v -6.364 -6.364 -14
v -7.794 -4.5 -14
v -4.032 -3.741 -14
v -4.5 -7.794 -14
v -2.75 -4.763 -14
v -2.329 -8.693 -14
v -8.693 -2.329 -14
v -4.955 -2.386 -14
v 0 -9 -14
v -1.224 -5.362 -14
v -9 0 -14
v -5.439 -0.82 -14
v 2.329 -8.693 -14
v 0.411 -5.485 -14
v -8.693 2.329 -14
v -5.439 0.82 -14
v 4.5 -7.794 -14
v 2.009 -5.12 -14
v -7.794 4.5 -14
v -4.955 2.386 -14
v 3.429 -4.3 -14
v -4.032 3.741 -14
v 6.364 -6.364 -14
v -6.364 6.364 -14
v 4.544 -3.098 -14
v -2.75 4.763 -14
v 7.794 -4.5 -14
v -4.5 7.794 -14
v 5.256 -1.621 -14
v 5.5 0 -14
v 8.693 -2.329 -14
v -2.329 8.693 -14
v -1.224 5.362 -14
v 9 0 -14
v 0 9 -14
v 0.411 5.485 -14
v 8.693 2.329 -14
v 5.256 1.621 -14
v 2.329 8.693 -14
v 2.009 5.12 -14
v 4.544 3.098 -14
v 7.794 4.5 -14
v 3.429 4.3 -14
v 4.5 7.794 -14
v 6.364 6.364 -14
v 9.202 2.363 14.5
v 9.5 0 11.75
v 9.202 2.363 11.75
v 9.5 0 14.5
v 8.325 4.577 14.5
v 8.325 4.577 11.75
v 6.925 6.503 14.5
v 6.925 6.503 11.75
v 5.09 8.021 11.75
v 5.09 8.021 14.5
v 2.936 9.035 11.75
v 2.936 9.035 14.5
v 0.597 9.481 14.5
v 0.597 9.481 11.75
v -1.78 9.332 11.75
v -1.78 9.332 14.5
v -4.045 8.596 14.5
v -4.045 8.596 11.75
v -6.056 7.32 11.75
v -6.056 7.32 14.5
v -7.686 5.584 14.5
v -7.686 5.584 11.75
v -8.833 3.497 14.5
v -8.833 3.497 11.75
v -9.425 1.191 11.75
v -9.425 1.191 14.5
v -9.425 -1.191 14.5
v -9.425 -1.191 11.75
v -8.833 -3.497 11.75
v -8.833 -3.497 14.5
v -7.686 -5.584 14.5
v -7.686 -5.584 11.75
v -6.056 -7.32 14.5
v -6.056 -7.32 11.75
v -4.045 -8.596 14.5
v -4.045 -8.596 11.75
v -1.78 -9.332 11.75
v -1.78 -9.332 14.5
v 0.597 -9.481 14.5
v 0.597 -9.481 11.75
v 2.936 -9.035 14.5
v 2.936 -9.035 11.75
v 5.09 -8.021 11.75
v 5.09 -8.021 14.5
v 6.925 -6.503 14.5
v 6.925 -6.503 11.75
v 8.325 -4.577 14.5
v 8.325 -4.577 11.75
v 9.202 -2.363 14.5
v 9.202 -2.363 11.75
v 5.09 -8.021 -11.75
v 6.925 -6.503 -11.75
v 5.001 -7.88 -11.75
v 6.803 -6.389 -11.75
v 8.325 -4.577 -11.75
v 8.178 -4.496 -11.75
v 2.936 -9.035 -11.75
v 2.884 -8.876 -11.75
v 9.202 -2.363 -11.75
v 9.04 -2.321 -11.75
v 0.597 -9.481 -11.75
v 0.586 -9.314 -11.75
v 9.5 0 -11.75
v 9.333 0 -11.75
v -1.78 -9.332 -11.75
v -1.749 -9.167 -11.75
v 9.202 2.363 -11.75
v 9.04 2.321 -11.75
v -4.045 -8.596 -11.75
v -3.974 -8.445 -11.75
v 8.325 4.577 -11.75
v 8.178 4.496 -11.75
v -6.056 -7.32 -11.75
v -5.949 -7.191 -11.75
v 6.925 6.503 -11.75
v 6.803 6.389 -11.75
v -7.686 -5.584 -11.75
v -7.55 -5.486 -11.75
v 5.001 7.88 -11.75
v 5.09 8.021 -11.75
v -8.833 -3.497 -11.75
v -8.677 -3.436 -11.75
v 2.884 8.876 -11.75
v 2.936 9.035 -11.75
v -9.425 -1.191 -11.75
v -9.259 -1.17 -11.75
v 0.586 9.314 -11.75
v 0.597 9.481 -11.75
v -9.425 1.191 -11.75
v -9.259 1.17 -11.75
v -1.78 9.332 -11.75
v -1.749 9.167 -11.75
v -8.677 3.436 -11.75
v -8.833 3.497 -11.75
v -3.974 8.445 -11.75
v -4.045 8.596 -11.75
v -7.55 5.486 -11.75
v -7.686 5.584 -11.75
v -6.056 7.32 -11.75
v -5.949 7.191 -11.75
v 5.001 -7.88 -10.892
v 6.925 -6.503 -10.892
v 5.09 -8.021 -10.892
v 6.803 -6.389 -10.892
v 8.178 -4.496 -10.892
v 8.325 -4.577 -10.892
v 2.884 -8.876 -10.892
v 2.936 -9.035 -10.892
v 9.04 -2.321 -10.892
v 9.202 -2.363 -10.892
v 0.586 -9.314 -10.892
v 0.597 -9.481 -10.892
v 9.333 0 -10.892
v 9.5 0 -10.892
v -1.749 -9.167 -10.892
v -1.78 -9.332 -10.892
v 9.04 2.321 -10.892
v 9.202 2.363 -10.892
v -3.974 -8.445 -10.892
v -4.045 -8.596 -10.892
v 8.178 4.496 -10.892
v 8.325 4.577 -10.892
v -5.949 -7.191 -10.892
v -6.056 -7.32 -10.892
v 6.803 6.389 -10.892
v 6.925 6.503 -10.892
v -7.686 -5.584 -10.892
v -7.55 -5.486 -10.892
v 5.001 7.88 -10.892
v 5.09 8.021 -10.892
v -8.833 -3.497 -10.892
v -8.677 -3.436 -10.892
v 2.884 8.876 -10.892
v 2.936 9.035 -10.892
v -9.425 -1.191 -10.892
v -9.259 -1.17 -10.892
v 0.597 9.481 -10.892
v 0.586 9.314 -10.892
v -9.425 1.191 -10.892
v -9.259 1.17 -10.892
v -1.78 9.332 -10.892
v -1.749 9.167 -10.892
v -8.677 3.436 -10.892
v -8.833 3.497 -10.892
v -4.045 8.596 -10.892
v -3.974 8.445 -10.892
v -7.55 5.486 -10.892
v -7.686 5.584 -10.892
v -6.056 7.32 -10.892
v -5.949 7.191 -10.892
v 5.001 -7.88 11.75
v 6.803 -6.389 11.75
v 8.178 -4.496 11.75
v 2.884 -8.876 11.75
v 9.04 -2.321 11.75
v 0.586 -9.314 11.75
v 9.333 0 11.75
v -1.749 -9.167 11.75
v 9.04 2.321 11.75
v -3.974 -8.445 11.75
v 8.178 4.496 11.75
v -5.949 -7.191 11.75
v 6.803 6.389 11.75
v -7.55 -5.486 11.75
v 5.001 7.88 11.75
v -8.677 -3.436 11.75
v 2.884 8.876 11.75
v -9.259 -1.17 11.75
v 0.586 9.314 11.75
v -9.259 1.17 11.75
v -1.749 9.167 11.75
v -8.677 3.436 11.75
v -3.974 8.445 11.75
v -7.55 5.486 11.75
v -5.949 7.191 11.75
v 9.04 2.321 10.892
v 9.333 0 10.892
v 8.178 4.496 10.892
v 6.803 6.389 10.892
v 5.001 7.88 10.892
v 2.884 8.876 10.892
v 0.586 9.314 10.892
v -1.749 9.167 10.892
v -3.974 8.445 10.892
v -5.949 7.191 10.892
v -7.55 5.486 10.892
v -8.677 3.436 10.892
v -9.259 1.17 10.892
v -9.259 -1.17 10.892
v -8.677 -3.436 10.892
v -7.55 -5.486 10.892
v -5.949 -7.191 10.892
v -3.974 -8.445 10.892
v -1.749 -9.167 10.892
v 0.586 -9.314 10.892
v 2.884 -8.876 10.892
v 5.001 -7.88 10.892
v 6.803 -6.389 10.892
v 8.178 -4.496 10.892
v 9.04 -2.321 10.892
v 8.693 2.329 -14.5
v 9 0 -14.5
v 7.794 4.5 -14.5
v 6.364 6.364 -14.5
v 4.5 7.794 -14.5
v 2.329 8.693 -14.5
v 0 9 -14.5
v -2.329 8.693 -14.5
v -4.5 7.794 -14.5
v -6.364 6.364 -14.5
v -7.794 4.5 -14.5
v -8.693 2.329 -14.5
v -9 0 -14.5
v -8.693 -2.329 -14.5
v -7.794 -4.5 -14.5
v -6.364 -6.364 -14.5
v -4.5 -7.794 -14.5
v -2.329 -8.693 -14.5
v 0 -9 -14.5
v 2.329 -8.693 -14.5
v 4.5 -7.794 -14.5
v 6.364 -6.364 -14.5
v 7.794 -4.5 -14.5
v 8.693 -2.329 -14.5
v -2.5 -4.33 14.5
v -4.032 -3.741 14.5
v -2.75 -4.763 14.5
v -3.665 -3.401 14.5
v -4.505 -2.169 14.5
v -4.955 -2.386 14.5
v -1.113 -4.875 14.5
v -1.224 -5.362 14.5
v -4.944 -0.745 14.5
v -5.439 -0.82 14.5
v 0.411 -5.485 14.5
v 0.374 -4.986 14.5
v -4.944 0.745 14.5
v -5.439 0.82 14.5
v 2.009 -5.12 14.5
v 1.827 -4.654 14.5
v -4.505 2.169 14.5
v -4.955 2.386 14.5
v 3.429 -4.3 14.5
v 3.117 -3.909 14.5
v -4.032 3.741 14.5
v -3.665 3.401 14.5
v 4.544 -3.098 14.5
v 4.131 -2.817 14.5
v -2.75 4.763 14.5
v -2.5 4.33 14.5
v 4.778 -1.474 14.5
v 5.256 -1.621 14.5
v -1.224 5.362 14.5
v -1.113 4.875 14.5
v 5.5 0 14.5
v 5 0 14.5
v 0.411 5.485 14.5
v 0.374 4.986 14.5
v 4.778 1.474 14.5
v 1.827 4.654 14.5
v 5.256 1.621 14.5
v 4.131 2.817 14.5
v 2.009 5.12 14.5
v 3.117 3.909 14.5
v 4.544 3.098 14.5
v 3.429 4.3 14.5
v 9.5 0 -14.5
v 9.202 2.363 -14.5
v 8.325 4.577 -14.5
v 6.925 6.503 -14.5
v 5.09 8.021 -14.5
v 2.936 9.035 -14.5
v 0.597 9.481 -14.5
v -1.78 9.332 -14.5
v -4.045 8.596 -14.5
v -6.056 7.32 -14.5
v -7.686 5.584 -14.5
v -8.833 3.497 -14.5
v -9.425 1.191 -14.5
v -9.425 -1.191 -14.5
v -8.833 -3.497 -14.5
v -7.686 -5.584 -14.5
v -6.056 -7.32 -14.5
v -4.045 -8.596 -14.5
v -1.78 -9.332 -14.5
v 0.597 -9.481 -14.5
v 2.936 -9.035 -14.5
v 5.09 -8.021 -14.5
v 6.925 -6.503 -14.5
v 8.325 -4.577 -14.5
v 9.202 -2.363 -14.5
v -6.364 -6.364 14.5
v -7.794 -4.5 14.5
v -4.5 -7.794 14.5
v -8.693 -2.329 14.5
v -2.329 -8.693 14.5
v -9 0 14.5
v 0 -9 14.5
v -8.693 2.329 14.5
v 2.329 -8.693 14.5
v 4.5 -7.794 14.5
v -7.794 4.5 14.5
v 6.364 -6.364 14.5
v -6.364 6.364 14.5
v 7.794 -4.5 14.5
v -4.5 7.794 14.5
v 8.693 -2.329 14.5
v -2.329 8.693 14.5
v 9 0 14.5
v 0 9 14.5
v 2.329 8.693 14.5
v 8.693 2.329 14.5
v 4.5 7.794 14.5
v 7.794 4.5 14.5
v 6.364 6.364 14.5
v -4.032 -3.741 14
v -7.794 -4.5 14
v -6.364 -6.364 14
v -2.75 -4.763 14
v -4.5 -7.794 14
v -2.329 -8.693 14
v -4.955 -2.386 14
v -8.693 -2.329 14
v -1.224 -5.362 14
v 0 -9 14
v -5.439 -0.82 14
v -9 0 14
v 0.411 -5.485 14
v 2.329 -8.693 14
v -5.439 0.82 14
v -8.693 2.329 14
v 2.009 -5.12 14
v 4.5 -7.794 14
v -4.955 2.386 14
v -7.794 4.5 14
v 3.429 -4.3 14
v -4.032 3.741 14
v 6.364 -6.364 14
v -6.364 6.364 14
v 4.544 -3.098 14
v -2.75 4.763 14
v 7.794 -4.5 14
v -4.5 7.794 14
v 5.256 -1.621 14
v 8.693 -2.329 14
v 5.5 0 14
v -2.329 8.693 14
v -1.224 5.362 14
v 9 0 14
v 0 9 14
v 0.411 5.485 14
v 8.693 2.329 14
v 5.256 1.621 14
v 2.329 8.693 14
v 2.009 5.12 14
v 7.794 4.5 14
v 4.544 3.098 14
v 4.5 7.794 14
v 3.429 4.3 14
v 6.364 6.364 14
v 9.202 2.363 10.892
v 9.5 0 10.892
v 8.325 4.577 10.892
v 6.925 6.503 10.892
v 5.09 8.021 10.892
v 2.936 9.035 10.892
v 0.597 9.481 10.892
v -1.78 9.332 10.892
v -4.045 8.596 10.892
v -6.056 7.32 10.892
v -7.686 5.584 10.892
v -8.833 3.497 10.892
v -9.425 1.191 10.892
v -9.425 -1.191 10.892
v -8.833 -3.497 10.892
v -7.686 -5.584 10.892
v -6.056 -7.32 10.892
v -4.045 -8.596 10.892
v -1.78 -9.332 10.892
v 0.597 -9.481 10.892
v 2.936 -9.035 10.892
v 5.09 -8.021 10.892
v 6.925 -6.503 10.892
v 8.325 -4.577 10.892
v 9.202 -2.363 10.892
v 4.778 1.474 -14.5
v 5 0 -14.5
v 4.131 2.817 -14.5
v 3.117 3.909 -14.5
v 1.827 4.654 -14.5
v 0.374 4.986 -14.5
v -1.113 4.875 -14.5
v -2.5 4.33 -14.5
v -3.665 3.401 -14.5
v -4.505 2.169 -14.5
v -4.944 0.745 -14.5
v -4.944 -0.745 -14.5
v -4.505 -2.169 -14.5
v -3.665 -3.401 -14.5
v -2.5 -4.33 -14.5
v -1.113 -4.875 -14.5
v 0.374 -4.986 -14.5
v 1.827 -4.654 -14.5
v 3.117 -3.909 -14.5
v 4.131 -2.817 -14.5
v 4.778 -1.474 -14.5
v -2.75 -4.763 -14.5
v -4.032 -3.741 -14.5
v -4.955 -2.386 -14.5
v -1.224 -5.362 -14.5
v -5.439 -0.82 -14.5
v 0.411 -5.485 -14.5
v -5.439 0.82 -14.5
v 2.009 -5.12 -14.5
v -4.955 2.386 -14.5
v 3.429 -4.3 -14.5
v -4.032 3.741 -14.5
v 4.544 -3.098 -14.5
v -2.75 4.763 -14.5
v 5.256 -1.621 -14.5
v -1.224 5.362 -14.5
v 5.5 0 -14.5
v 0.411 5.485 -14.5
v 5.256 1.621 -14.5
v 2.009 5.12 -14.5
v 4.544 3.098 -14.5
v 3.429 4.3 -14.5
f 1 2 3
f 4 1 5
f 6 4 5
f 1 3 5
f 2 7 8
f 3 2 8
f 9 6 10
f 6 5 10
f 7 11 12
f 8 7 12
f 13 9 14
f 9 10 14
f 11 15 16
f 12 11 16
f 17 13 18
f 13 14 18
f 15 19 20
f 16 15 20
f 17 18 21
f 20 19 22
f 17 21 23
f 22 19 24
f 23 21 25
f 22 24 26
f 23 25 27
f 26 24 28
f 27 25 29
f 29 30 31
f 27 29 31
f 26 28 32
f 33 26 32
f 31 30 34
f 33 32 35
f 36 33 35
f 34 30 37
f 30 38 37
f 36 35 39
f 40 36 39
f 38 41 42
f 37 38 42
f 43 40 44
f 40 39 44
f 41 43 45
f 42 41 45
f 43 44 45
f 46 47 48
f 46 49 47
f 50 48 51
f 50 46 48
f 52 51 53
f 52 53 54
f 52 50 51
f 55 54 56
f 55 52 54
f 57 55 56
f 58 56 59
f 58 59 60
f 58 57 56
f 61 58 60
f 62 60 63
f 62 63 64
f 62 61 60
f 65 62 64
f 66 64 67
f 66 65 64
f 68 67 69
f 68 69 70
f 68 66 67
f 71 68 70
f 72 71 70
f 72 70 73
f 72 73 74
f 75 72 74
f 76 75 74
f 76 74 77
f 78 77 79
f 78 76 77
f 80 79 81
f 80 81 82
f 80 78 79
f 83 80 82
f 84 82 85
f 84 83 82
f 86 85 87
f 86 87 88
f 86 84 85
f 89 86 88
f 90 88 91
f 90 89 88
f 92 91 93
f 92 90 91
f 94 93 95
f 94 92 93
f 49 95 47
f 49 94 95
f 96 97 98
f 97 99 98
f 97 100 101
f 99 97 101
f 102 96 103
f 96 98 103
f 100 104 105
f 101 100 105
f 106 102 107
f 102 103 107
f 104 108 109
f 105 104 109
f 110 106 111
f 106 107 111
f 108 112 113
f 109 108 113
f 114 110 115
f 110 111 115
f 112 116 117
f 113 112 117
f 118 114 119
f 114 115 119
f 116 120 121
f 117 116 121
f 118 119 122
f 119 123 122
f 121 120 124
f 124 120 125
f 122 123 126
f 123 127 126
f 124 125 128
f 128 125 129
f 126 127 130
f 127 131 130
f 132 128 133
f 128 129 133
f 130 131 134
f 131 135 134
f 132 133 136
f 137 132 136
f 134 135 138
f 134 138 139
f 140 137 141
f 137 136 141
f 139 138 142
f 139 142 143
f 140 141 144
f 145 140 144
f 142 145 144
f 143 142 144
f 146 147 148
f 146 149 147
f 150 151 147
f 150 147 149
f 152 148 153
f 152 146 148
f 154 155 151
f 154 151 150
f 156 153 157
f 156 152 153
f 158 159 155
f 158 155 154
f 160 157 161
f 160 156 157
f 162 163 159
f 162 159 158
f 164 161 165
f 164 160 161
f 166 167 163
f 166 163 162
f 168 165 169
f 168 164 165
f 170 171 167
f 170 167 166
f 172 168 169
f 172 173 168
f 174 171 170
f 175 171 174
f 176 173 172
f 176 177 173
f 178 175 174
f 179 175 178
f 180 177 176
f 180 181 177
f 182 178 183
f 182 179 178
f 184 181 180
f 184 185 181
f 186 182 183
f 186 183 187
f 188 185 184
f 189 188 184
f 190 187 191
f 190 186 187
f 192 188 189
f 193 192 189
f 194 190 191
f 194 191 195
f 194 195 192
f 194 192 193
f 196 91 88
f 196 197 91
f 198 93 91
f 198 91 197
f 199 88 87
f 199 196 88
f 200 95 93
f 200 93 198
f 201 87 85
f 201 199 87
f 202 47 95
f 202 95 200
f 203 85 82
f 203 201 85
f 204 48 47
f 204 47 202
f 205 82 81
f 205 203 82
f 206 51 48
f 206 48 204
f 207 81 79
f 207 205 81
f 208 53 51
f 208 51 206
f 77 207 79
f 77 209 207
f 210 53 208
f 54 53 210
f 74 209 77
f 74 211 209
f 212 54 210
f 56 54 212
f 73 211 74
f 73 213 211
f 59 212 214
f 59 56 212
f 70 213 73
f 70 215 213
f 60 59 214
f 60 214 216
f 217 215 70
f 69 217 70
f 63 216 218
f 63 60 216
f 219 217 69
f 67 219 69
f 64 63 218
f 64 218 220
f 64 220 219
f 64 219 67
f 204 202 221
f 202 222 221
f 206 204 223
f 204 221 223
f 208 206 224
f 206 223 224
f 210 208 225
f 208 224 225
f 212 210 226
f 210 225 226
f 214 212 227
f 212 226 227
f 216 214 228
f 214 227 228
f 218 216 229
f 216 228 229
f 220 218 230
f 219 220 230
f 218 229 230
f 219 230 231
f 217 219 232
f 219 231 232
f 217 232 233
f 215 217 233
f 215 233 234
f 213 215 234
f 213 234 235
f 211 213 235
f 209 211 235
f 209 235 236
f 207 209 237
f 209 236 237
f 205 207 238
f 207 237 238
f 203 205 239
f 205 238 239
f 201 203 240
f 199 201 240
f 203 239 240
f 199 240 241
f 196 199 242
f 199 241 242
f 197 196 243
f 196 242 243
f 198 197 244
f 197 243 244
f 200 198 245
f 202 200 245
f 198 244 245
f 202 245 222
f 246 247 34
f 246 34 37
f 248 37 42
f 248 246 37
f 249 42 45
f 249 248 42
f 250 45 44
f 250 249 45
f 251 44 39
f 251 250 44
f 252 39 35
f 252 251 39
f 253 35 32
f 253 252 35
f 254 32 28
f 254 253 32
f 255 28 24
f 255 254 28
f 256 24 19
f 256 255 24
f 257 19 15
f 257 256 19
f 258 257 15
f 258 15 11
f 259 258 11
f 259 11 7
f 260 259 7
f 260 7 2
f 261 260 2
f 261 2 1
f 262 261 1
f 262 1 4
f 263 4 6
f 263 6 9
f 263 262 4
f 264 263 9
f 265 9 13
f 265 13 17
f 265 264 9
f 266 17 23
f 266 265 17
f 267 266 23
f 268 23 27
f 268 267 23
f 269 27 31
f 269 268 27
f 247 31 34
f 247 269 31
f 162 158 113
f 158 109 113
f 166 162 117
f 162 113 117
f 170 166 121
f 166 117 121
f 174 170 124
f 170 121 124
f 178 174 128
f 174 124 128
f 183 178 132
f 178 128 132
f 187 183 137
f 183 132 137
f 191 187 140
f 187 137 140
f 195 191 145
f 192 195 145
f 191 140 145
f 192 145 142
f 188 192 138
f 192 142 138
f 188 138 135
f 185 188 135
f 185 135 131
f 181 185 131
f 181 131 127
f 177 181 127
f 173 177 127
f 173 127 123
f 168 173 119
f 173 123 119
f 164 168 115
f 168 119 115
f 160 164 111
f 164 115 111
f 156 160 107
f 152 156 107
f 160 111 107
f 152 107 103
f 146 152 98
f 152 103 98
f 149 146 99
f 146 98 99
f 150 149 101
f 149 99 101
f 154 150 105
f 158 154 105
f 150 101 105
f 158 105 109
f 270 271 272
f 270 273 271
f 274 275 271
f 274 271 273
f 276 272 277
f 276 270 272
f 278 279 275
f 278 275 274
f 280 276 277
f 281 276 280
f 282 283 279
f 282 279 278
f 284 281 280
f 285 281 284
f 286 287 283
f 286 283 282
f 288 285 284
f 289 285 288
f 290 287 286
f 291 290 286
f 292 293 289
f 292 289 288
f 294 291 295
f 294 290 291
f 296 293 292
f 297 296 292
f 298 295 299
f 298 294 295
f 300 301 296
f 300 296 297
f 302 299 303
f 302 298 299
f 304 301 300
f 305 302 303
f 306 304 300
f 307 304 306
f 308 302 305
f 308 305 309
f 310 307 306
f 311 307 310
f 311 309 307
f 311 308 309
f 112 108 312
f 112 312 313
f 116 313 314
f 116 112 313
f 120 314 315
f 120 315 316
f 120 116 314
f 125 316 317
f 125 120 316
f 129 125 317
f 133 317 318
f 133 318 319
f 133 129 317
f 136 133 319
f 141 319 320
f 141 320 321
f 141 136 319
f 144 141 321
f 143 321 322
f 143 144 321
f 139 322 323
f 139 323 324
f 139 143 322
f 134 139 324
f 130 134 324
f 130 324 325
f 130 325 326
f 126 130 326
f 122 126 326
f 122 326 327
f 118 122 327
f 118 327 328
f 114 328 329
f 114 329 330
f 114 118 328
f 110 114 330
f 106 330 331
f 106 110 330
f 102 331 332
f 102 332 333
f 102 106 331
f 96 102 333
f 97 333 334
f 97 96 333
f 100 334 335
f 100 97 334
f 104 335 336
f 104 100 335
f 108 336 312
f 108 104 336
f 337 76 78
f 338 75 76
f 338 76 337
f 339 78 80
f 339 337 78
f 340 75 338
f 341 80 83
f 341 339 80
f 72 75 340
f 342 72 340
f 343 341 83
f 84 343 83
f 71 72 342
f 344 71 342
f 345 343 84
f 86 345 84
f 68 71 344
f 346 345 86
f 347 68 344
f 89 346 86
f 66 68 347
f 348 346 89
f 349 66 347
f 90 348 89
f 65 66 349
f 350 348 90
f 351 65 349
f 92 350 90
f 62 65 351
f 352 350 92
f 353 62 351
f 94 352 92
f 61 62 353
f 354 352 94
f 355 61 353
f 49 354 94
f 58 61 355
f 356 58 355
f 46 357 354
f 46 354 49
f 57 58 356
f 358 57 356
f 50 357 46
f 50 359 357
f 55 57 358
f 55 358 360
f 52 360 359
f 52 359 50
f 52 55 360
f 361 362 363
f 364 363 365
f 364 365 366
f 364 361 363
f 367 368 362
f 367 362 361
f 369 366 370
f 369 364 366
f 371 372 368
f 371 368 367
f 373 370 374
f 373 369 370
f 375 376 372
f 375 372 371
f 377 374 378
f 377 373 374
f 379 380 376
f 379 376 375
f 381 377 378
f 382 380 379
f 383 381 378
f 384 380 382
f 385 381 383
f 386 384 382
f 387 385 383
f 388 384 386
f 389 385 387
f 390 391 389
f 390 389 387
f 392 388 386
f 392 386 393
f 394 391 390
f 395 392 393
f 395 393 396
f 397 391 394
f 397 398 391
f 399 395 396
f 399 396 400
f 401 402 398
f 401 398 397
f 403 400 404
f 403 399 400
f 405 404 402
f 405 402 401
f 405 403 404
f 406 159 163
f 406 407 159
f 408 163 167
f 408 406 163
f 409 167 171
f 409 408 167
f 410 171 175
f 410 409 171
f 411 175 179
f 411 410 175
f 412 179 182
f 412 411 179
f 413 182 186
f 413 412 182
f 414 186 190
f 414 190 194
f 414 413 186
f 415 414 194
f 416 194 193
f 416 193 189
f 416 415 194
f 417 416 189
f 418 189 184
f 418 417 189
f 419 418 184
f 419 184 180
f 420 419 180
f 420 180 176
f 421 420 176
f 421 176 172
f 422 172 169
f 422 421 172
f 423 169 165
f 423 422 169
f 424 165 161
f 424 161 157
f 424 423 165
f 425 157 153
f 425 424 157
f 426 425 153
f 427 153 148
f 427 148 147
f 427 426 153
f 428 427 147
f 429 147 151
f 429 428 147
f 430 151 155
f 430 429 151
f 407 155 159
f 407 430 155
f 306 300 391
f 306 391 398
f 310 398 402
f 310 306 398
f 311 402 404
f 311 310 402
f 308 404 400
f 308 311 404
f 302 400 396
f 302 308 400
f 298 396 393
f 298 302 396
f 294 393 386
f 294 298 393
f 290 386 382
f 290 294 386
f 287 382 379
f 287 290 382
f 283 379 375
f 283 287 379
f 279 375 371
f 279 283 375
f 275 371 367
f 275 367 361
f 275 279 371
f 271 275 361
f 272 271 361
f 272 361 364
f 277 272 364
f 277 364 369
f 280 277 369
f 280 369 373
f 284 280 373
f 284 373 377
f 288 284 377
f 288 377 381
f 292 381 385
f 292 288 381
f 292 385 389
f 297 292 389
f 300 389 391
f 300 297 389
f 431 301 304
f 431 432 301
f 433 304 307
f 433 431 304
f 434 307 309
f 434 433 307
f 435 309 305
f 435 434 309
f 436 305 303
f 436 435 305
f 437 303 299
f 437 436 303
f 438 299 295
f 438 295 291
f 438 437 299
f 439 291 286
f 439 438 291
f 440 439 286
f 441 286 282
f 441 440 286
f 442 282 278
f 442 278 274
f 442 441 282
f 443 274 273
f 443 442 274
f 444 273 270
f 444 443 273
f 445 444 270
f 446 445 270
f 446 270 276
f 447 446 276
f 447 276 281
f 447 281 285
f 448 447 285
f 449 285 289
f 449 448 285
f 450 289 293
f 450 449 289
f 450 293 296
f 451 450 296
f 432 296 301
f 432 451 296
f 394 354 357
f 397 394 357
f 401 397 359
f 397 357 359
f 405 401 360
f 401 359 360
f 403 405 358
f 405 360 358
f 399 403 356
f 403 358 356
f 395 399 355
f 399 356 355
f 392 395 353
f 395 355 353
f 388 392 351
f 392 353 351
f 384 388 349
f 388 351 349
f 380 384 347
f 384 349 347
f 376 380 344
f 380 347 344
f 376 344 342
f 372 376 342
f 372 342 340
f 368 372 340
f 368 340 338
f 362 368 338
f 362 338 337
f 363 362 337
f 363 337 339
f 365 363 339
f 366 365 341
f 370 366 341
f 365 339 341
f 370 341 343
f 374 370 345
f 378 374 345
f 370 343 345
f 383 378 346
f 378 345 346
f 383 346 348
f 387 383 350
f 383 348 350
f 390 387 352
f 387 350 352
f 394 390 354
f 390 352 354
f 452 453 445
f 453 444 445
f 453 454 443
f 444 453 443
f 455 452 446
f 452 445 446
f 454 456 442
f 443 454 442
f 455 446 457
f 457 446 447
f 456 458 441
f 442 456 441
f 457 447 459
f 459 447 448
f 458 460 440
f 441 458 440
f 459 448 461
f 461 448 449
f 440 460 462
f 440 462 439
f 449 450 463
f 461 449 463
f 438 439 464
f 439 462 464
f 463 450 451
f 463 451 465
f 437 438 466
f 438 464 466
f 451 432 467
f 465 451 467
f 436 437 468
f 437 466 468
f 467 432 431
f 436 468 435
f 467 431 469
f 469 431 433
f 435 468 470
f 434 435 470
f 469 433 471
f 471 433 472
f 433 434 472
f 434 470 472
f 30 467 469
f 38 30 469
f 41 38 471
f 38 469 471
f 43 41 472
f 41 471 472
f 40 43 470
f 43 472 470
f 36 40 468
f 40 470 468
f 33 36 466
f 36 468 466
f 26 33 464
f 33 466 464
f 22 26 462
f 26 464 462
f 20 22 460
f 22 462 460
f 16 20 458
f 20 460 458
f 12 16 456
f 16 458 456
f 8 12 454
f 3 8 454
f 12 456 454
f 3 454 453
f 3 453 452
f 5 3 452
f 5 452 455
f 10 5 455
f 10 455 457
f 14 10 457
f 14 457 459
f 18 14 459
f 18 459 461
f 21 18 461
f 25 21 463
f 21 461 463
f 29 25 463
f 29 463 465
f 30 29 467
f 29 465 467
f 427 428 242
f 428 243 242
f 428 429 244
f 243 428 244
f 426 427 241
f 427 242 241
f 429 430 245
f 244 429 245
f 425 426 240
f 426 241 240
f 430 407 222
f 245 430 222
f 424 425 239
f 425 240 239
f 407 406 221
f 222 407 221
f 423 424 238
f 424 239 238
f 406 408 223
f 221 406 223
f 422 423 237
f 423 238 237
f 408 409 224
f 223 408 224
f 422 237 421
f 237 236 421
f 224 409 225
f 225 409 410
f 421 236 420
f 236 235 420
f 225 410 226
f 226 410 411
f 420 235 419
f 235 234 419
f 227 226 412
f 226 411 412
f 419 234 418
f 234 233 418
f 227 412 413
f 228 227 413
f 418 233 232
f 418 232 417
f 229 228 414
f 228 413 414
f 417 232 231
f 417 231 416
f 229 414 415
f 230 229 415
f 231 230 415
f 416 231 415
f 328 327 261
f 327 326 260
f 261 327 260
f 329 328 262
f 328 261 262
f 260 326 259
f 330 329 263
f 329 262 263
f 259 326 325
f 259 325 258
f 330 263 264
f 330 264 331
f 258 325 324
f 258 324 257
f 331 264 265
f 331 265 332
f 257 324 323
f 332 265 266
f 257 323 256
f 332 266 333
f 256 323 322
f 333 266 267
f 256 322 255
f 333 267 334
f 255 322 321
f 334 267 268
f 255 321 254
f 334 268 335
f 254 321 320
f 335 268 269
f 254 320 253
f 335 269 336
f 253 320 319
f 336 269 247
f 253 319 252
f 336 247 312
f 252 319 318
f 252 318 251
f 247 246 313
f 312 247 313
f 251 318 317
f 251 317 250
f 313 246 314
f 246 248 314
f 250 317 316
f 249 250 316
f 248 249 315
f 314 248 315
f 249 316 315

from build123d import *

# Parameters (mm, degrees)
SKETCH1_R           = 9.5
SKETCH1_R_2         = 5
BOSS_EXTRUDE1_DEPTH = 14.5
SKETCH2_W           = 0.167239634
SKETCH2_H           = 0.858355734
SKETCH3_R           = 9
SKETCH3_R_2         = 5.5
CUT_EXTRUDE1_DEPTH  = 0.5


with BuildPart() as part:
    # Sketch1 → Boss-Extrude1 (new body, symmetric)
    with BuildSketch(Plane.XY):
        Circle(SKETCH1_R)
        Circle(SKETCH1_R_2, mode=Mode.SUBTRACT)
    extrude(amount=BOSS_EXTRUDE1_DEPTH, both=True)

    # Sketch2 → Cut-Revolve1 (revolve, cut)
    with BuildSketch(Plane(origin=(0, 0, 0), x_dir=(1, 0, 0), z_dir=(0, 1, 0))):
        with Locations((9.416380183, -11.320822133)):
            Rectangle(SKETCH2_W, SKETCH2_H)
        with Locations((9.416380183, 11.320822133)):
            Rectangle(SKETCH2_W, SKETCH2_H)
    revolve(axis=Axis((0, 0, 0), (0, 0, 1)), mode=Mode.SUBTRACT)

    # Sketch3 → Cut-Extrude1 (cut)
    with BuildSketch(Plane.XY.offset(14.5)):
        Circle(SKETCH3_R)
        Circle(SKETCH3_R_2, mode=Mode.SUBTRACT)
    cut_extrude1 = extrude(amount=-CUT_EXTRUDE1_DEPTH, mode=Mode.SUBTRACT)

    # Mirror1: Cut-Extrude1 across plane
    add(cut_extrude1.mirror(Plane.XY), mode=Mode.SUBTRACT)


solid = part.part
